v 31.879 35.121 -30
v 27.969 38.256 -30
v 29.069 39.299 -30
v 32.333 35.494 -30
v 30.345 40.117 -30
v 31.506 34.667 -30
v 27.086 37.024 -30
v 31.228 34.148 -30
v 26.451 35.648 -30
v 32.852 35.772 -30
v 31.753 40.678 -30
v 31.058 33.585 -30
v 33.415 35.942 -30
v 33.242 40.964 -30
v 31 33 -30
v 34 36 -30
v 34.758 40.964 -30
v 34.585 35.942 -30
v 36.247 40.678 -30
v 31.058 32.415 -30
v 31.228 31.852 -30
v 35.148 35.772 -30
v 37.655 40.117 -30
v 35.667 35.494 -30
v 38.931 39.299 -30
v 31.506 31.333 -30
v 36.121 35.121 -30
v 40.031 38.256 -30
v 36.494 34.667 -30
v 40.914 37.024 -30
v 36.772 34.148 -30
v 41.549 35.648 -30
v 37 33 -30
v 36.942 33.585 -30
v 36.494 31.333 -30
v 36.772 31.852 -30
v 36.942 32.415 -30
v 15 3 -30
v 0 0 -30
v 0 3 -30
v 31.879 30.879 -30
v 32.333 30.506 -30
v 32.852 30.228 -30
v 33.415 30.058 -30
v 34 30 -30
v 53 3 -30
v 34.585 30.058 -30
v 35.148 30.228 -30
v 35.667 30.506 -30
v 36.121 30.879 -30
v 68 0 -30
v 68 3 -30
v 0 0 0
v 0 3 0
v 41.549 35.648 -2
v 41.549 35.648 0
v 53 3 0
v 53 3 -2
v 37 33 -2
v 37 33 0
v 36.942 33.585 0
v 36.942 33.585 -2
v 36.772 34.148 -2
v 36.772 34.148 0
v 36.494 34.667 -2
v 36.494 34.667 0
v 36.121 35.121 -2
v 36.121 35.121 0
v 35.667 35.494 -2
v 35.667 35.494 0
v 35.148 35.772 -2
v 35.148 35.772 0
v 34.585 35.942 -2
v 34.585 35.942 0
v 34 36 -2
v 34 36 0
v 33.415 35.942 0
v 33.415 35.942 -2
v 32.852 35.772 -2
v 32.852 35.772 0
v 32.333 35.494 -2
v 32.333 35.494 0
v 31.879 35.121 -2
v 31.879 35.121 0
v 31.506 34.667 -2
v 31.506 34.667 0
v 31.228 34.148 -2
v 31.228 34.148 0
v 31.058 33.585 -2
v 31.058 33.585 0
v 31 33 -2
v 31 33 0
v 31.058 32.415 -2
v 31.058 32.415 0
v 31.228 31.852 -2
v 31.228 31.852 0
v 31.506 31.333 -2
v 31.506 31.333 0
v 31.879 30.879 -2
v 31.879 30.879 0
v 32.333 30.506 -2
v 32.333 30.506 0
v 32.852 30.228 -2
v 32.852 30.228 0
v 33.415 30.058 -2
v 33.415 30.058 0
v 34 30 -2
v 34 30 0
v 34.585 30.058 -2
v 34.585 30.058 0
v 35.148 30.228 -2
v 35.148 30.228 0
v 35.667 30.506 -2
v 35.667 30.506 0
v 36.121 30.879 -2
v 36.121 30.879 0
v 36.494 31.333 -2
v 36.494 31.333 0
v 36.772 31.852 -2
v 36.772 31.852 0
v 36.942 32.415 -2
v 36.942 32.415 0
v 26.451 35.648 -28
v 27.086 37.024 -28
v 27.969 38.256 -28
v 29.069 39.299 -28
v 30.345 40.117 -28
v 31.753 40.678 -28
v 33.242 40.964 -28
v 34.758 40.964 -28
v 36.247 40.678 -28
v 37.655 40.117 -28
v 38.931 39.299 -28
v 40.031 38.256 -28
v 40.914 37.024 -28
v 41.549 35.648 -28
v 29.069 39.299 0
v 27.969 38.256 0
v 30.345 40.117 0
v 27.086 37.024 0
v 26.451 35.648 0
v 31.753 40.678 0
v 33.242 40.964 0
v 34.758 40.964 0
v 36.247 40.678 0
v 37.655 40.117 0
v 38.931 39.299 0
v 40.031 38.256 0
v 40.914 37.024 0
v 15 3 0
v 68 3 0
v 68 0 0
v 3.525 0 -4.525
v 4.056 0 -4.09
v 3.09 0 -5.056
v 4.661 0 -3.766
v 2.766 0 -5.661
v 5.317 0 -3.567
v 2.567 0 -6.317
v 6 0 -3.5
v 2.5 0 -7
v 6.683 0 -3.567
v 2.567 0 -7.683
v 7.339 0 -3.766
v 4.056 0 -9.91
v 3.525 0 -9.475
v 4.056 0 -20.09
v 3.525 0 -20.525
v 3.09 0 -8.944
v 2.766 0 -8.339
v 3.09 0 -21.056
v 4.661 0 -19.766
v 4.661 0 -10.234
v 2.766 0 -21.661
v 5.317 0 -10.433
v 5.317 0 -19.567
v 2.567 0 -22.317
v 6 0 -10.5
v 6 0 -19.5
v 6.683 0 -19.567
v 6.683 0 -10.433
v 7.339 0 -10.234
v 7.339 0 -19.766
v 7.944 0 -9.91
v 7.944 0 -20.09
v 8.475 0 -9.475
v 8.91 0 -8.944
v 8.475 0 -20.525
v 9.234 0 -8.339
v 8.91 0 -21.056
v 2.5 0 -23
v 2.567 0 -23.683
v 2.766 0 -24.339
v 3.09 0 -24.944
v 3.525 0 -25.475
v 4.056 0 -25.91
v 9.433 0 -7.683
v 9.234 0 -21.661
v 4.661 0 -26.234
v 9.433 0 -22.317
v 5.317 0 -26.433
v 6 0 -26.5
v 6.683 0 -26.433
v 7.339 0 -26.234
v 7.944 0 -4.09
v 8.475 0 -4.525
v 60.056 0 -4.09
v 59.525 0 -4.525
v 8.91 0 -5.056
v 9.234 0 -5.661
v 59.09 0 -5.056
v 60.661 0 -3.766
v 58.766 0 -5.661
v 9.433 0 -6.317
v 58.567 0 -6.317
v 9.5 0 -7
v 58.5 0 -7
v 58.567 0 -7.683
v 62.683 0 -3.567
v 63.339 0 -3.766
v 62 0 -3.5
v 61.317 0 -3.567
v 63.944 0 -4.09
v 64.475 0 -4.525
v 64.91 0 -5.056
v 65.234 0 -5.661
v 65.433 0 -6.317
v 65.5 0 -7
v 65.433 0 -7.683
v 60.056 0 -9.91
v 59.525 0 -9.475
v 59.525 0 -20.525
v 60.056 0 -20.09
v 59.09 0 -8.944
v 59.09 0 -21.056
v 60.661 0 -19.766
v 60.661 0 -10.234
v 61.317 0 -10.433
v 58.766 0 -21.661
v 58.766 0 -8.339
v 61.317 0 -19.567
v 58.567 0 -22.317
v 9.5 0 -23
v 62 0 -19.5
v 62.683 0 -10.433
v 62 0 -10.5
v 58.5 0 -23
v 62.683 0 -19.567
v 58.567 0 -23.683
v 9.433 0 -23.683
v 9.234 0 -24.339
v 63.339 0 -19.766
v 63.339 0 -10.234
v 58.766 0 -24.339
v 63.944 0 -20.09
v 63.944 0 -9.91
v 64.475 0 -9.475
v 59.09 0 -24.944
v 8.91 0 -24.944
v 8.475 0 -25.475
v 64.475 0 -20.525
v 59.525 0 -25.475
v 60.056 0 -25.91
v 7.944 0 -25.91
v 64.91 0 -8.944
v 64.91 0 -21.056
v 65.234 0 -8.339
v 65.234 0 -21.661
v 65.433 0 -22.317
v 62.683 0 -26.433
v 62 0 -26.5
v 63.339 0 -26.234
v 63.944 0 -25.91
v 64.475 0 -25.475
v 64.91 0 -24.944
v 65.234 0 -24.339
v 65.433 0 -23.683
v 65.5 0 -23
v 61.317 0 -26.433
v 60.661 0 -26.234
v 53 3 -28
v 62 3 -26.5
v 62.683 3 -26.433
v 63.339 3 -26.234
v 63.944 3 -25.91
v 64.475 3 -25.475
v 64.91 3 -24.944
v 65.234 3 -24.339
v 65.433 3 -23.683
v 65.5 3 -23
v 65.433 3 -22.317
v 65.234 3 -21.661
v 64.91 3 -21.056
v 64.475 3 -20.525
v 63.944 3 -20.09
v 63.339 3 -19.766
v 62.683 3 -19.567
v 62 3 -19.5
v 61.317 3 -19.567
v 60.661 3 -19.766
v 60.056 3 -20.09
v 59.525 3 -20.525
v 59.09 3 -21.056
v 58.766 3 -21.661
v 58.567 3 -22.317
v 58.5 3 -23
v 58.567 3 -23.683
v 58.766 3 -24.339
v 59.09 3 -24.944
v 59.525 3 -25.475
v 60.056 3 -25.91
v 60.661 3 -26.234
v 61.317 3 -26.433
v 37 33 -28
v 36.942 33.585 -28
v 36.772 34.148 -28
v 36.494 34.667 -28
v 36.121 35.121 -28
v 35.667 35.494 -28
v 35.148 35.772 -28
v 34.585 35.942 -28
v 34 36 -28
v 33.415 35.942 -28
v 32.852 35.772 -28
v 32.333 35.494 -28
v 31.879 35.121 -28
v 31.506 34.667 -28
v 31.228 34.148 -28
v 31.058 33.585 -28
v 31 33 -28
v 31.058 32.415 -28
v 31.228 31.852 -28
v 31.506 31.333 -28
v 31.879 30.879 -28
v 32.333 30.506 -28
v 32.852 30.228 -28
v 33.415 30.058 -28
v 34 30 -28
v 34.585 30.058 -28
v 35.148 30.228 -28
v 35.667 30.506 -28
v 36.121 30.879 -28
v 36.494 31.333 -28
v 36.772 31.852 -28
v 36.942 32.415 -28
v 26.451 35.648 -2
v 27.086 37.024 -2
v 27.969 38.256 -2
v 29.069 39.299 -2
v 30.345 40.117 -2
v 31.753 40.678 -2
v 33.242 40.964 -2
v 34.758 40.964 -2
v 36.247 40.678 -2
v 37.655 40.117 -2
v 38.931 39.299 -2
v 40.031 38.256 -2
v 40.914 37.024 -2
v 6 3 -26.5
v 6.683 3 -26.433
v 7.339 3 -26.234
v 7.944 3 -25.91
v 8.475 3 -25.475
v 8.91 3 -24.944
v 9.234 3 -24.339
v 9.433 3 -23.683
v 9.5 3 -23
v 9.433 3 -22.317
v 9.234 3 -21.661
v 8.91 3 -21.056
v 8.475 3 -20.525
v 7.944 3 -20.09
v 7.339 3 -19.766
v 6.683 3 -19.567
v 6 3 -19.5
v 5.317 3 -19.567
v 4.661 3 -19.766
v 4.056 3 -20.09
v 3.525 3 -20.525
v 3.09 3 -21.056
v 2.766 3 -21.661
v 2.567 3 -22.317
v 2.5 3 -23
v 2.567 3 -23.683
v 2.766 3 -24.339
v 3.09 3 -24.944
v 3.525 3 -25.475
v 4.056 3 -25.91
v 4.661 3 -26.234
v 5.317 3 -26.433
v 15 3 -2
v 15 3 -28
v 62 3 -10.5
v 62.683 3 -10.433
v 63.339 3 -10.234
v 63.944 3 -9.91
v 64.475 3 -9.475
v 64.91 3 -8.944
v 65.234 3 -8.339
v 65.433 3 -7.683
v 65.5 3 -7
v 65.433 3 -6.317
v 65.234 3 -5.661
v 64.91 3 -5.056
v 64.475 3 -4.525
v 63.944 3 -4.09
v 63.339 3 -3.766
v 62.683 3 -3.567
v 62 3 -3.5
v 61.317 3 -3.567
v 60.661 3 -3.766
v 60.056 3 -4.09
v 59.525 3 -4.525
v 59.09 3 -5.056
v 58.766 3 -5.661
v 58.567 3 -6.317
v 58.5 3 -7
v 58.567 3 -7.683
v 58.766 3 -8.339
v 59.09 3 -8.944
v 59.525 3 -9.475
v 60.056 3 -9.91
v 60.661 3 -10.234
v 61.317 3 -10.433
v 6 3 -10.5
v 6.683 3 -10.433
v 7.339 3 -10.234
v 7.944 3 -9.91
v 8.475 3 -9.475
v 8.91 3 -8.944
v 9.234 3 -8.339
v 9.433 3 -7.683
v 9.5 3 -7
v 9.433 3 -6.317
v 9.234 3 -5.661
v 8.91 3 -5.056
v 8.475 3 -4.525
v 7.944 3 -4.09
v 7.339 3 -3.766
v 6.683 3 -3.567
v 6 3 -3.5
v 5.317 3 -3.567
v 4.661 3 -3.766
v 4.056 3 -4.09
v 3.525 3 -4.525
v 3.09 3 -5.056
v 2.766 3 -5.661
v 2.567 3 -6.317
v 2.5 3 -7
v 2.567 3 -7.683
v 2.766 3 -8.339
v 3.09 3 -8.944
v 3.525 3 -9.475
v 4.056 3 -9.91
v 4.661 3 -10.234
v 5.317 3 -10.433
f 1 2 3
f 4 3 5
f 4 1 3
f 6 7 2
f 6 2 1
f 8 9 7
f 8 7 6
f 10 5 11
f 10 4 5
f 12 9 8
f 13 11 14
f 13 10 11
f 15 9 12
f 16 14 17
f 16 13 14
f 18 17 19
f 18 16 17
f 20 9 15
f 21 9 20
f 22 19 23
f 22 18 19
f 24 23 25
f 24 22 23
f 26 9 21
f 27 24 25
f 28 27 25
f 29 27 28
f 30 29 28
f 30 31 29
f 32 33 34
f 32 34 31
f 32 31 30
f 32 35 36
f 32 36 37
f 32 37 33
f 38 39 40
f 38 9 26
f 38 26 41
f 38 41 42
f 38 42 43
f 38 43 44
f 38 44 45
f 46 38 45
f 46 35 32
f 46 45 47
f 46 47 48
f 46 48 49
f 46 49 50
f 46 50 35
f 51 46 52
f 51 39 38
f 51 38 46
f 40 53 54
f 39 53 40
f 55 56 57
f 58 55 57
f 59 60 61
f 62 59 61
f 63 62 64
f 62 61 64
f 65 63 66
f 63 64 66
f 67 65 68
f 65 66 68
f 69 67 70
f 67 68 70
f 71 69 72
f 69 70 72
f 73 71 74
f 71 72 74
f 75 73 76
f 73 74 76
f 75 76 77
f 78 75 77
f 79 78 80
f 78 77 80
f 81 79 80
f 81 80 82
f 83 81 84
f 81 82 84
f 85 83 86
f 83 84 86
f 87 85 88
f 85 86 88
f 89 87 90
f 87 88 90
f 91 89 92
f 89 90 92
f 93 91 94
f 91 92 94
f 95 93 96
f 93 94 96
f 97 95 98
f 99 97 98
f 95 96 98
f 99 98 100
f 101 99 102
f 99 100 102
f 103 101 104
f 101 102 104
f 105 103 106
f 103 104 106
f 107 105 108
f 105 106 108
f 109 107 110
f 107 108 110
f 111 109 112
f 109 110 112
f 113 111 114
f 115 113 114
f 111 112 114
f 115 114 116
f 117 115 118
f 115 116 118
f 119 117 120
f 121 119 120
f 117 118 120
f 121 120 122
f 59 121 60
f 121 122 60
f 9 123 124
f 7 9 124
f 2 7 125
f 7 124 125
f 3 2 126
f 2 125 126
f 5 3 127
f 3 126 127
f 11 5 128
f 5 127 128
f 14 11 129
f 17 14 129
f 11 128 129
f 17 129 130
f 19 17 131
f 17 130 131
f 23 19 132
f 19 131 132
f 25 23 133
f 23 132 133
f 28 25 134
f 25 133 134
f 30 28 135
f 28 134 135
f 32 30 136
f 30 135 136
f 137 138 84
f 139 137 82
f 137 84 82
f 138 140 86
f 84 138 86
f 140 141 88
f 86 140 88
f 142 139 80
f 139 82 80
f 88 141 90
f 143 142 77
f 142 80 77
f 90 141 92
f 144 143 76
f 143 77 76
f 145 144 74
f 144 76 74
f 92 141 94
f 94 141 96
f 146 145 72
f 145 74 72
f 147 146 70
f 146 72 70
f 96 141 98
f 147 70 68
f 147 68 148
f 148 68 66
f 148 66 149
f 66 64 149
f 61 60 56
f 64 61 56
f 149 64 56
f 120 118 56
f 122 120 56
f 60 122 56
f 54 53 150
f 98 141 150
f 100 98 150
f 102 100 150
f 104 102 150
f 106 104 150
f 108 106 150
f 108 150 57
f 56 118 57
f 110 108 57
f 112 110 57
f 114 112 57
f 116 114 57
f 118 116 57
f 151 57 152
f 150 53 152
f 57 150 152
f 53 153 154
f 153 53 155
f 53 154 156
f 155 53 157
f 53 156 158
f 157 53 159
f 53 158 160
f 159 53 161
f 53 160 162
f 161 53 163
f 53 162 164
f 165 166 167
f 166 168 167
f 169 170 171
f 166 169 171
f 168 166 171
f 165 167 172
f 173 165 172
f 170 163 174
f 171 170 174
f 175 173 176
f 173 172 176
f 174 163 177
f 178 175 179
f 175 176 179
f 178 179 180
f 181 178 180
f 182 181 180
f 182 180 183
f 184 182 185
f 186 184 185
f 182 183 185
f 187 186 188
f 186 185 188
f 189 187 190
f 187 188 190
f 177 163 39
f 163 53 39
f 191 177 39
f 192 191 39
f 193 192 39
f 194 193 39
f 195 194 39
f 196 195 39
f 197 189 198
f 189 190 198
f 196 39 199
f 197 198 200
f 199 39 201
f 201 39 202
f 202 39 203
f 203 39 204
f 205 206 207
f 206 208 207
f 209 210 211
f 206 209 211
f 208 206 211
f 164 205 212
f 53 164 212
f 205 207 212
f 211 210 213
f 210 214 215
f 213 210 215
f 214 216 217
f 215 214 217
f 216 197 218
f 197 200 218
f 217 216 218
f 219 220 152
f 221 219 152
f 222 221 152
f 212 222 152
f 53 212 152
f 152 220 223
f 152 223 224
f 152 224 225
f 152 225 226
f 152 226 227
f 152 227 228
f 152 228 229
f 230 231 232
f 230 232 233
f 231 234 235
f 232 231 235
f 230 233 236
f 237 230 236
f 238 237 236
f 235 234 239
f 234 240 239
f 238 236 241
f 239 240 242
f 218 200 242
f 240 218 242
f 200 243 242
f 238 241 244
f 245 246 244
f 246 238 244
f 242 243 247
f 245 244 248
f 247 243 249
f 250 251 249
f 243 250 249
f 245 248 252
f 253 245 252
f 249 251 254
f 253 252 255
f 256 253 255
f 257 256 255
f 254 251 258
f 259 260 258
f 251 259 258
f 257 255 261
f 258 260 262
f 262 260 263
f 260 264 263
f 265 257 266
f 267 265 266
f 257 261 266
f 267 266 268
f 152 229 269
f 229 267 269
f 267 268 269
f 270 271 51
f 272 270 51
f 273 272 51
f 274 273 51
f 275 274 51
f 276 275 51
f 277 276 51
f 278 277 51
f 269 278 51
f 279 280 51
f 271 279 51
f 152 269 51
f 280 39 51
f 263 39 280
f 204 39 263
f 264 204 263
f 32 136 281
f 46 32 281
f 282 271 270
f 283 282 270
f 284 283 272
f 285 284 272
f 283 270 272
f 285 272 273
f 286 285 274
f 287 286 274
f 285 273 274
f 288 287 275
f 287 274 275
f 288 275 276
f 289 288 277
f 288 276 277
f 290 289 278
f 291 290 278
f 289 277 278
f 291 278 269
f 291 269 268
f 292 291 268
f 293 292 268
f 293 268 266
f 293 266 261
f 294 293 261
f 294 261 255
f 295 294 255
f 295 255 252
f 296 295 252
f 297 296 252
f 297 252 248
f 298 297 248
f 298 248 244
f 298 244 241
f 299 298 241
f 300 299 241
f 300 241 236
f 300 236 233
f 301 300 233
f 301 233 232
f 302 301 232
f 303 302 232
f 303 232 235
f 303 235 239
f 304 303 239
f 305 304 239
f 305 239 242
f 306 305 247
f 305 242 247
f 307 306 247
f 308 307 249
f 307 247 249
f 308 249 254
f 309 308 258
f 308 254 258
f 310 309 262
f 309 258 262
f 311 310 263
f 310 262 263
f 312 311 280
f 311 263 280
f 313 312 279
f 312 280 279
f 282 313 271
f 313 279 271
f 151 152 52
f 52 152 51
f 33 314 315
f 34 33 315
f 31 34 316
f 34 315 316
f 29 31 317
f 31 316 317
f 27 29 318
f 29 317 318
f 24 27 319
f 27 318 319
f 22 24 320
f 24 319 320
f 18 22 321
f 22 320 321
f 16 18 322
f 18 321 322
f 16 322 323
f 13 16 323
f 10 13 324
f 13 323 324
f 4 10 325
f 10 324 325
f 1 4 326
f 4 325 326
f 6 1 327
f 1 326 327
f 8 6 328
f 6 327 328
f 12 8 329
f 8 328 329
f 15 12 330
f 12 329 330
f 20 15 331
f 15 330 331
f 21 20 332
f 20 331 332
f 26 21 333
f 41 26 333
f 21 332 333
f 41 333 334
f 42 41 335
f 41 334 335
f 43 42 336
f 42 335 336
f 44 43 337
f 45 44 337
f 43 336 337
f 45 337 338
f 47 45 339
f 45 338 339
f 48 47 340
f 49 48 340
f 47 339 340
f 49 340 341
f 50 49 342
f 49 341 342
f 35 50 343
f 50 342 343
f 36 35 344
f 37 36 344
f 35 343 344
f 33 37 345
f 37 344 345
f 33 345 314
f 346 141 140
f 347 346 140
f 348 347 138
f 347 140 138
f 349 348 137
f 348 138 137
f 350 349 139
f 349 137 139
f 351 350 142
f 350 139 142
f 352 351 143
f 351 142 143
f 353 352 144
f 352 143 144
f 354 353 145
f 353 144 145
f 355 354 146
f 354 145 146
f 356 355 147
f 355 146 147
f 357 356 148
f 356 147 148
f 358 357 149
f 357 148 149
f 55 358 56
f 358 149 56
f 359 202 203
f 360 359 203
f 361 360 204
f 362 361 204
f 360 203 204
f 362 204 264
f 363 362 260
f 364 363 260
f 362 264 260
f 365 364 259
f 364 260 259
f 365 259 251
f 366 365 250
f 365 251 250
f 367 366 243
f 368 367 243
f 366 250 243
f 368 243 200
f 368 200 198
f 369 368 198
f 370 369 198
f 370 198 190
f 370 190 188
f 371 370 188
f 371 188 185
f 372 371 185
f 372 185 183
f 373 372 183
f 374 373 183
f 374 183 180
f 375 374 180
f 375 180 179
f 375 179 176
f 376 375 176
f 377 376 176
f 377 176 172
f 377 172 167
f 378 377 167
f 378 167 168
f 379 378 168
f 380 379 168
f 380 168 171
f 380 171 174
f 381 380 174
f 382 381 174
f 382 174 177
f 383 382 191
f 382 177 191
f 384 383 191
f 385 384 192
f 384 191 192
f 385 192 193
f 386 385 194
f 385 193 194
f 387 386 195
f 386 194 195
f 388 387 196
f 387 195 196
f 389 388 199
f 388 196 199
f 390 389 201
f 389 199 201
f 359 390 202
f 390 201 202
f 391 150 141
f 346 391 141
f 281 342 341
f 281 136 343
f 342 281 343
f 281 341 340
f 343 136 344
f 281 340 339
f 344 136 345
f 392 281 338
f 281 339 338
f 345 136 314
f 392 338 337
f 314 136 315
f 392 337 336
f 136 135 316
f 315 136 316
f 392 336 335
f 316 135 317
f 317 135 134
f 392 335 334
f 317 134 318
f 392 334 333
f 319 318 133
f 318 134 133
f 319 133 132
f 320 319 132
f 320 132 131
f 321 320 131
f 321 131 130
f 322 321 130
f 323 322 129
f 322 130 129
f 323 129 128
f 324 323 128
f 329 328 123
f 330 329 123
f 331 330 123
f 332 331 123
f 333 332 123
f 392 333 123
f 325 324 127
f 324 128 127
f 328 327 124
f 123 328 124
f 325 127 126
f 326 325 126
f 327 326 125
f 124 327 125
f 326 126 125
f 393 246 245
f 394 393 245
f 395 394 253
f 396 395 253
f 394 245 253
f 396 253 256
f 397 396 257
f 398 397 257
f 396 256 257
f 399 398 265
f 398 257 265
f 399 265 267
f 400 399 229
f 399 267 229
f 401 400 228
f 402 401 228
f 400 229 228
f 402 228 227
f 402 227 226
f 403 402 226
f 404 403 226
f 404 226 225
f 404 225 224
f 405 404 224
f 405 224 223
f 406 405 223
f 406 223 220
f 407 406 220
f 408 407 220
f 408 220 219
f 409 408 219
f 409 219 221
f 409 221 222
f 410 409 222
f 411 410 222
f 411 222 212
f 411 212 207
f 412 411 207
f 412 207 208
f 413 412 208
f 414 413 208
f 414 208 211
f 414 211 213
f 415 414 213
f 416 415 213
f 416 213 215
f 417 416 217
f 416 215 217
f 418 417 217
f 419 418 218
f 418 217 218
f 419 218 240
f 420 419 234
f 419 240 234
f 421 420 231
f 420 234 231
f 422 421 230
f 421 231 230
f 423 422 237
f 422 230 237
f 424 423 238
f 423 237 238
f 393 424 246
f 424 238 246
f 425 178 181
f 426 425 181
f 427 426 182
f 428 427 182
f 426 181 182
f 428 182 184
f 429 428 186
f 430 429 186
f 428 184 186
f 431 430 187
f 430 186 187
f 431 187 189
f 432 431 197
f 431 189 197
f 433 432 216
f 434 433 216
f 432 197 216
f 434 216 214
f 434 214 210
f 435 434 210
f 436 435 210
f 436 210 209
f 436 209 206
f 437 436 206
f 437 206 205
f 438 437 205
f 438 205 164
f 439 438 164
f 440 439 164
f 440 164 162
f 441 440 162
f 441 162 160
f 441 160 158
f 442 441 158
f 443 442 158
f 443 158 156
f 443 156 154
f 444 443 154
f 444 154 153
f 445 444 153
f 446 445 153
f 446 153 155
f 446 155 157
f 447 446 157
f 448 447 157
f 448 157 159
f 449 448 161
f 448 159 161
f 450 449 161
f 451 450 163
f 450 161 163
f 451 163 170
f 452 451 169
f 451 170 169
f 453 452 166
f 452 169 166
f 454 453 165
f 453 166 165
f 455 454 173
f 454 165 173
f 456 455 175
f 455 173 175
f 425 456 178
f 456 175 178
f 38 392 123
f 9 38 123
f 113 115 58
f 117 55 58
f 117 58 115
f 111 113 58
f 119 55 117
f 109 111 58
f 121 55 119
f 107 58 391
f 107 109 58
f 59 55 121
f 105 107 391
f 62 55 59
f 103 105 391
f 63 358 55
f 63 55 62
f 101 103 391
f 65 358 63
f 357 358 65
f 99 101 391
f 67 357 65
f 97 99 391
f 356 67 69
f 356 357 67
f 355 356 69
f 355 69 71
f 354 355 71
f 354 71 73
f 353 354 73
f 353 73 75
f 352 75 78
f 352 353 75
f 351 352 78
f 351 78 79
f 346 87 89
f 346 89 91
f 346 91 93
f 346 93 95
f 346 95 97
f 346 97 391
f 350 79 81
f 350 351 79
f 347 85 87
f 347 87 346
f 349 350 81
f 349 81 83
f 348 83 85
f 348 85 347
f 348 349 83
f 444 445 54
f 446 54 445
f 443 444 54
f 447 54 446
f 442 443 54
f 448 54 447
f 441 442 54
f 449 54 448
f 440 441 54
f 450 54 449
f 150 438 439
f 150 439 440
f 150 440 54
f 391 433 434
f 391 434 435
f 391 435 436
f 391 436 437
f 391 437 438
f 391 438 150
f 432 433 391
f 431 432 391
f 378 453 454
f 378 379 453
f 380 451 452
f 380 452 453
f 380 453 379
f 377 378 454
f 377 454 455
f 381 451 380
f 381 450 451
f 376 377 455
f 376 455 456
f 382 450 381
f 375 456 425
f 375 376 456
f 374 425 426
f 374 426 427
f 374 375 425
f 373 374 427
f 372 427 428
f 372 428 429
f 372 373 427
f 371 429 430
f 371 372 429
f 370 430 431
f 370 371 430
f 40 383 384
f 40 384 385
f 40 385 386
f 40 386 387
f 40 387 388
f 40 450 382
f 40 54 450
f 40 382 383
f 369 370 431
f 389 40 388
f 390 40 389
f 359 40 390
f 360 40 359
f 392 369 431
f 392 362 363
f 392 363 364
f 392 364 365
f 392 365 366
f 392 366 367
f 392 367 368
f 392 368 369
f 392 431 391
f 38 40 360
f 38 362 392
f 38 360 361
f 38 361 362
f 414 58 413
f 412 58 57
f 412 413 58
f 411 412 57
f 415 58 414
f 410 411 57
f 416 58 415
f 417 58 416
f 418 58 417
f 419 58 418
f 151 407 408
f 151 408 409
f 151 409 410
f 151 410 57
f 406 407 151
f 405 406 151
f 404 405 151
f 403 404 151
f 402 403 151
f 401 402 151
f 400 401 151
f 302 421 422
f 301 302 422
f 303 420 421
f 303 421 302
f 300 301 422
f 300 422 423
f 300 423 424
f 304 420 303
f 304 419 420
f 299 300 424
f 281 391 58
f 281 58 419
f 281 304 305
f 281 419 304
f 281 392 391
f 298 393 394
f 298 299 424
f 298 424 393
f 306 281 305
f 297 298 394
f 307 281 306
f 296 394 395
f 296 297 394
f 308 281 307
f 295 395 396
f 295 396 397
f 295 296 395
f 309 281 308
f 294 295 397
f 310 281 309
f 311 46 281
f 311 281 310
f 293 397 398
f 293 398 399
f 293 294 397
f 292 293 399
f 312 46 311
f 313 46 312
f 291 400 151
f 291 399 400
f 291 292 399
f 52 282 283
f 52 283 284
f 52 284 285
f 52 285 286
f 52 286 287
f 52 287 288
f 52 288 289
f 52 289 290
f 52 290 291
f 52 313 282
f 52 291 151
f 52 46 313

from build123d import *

# Parameters (mm, degrees)
SKETCH_1_W          = 68
SKETCH_1_H          = 30
EXTRUDE_1_DEPTH     = 3
SKETCH_2_R          = 3
EXTRUDE_2_DEPTH     = 2
EXTRUDE_START       = -28
SKETCH_2_2_R        = 3
EXTRUDE_3_DEPTH     = 2
SKETCH_3_R          = 3.5
CUT_EXTRUDE_1_DEPTH = 12


with BuildPart() as part:
    # 草图1 → 凸台-拉伸1 (new body)
    with BuildSketch(Plane(origin=(0, 0, 0), x_dir=(1, 0, 0), z_dir=(0, 1, 0))):
        with Locations((34, 15)):
            Rectangle(SKETCH_1_W, SKETCH_1_H)
    extrude(amount=EXTRUDE_1_DEPTH)

    # 草图2 → 凸台-拉伸2 (add)
    with BuildSketch(Plane.XY):
        with BuildLine():
            Line((15, 3), (26.450876235, 35.647778385))
            ThreePointArc((26.450876235, 35.647778385), (34, 41), (41.549123765, 35.647778385))
            Line((41.549123765, 35.647778385), (53, 3))
            Line((53, 3), (15, 3))
        make_face()
        with Locations((34, 33)):
            Circle(SKETCH_2_R, mode=Mode.SUBTRACT)
    extrude(amount=-EXTRUDE_2_DEPTH)

    # 草图2<2> → 凸台-拉伸3 (add)
    with BuildSketch(Plane.XY.offset(EXTRUDE_START)):
        with BuildLine():
            Line((15, 3), (26.450876235, 35.647778385))
            ThreePointArc((26.450876235, 35.647778385), (34, 41), (41.549123765, 35.647778385))
            Line((41.549123765, 35.647778385), (53, 3))
            Line((53, 3), (15, 3))
        make_face()
        with Locations((34, 33)):
            Circle(SKETCH_2_2_R, mode=Mode.SUBTRACT)
    extrude(amount=-EXTRUDE_3_DEPTH)

    # 草图3 → 切除-拉伸1 (cut)
    with BuildSketch(Plane.XZ):
        with Locations(Location((6, -7, 0), (0, 0, 270))):
            Circle(SKETCH_3_R)
        with Locations(Location((6, -23, 0), (0, 0, 270))):
            Circle(SKETCH_3_R)
        with Locations(Location((62, -7, 0), (0, 0, 270))):
            Circle(SKETCH_3_R)
        with Locations(Location((62, -23, 0), (0, 0, 270))):
            Circle(SKETCH_3_R)
    extrude(amount=-CUT_EXTRUDE_1_DEPTH, mode=Mode.SUBTRACT)


solid = part.part
